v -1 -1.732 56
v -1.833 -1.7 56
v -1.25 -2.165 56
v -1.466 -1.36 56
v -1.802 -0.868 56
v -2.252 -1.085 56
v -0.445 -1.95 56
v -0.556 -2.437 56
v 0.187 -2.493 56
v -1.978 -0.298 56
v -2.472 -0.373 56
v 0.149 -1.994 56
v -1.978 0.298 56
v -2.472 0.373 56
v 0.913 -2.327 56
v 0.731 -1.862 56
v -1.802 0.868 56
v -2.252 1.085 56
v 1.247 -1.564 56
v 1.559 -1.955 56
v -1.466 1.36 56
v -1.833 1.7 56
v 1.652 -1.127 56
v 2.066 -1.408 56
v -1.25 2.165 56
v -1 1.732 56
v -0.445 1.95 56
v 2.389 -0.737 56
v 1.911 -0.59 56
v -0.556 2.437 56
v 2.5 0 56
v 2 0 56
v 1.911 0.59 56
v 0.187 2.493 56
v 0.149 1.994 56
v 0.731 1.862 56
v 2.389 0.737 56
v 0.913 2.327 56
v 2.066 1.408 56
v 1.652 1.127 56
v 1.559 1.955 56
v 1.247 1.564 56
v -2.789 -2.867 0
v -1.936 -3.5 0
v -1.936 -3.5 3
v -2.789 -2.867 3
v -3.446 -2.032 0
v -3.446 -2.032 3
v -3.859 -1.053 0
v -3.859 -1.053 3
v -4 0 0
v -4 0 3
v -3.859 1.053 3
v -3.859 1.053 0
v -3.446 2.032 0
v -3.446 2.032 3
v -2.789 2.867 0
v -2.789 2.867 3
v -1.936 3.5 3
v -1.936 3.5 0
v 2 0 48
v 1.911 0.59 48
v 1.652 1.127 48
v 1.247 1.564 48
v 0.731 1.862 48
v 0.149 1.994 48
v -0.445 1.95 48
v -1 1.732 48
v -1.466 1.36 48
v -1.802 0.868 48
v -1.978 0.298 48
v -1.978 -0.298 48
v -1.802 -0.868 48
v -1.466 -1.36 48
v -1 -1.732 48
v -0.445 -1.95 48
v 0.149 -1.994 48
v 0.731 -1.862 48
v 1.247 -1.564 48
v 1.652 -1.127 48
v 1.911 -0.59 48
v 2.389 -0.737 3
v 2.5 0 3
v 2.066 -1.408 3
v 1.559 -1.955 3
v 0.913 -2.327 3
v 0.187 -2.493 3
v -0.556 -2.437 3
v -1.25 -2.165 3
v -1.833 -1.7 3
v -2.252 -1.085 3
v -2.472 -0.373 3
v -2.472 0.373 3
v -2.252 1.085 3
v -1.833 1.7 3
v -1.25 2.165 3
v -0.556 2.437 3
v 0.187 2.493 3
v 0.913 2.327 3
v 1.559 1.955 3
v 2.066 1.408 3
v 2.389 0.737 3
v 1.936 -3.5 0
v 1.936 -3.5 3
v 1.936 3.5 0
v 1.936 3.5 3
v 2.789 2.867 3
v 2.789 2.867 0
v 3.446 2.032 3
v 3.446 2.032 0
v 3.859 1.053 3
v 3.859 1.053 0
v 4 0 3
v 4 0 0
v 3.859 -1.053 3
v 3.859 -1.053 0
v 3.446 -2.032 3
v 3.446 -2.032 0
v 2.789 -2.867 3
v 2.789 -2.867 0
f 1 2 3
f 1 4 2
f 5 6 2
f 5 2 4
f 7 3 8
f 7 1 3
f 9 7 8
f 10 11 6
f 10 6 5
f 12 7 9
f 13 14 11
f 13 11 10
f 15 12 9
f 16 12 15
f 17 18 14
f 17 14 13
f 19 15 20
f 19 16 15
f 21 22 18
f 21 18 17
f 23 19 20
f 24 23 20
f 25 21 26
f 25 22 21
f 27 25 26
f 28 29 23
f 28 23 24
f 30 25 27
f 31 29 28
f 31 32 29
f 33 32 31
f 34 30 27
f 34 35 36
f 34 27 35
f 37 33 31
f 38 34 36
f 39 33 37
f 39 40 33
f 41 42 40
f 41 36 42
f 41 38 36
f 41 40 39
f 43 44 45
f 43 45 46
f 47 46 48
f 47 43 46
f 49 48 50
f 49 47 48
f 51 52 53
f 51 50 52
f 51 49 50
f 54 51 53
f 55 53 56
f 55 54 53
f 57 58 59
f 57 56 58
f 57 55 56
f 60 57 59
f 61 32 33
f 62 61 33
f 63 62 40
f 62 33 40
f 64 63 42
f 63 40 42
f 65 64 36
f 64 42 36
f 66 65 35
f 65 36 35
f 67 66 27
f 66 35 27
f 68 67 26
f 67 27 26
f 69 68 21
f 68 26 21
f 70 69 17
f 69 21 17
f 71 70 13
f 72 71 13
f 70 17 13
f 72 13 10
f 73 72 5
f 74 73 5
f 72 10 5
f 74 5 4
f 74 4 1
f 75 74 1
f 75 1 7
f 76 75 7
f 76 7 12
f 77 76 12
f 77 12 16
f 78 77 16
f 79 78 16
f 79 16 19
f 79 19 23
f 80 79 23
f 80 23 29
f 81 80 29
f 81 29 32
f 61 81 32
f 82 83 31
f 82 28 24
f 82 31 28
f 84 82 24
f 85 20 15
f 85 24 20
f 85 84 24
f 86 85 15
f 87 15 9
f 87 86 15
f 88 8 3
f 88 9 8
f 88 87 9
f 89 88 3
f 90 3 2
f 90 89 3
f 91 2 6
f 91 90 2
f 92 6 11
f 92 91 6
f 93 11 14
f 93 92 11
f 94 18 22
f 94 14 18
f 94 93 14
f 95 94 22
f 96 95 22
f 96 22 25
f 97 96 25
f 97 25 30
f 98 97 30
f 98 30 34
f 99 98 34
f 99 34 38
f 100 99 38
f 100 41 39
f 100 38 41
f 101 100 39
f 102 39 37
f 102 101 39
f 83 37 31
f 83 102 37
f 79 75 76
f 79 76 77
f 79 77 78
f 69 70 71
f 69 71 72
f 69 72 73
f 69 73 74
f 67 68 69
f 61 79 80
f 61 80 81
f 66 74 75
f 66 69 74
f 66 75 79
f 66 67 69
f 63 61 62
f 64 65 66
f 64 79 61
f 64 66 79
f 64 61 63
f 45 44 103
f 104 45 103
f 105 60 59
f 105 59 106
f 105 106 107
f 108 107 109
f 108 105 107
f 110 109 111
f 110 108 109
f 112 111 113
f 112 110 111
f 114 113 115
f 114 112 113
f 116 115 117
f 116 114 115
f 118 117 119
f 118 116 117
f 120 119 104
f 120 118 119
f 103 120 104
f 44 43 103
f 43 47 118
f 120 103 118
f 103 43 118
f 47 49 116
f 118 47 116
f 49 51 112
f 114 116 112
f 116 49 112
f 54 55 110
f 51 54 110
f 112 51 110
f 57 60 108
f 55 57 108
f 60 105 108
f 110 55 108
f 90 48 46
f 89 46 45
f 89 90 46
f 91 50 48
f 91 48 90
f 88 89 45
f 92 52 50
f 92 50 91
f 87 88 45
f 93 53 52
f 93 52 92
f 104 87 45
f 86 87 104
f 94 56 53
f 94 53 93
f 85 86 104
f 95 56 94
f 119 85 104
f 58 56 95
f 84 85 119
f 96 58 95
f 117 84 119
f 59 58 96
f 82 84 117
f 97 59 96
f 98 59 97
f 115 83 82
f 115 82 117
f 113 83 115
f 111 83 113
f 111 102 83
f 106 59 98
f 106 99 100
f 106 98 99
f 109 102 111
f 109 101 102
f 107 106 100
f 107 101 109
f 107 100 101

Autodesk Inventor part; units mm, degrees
ref_plane "YZ Plane" through (0, 0, 0) normal (1, 0, 0) x (0, 1, 0)
ref_plane "XZ Plane" through (0, 0, 0) normal (0, 1, 0) x (-1, 0, 0)
ref_plane "XY Plane" through (0, 0, 0) normal (0, 0, 1) x (1, 0, 0)
sketch "Sketch1" plane through (0, 0, 0) normal (0, 0, 1) x (1, 0, 0)
  circle A0 centre (0, 0) radius 4
  line L0 (-0.0635, 3.5) -> (1.9365, 3.5)
  line L1 (-0.0635, 3.5) -> (2, 3.5) construction
  line L2 (1.9365, 3.5) -> (-1.9365, 3.5)
  line L3 (0, -3.5) -> (1.9365, -3.5)
  line L4 (1.9365, -3.5) -> (-1.9365, -3.5)
  dimension "d0" = 8
  dimension "d1" = 2
  dimension "d2" = 0
extrude "Extrusion1" add sketch "Sketch1" along normal blind 3 contours A0 L3 L4 L2 L0
sketch "Sketch2" plane through (0, 0, 3) normal (0, 0, 1) x (1, 0, 0)
  circle A0 centre (0, 0) radius 2.5
  dimension "d5" = 5
extrude "Extrusion2" add sketch "Sketch2" along normal blind 53
sketch "Sketch3" plane through (0, 0, 56) normal (0, 0, 1) x (1, 0, 0)
  arc A0 (-1.9365, 3.5) -> (-1.9365, -3.5) centre (0, 0) ccw projected
  circle A1 centre (0, 0) radius 2
  dimension "d8" = 4
extrude "Extrusion3" cut sketch "Sketch3" against normal blind 8
properties part number "Rotation Pin"
